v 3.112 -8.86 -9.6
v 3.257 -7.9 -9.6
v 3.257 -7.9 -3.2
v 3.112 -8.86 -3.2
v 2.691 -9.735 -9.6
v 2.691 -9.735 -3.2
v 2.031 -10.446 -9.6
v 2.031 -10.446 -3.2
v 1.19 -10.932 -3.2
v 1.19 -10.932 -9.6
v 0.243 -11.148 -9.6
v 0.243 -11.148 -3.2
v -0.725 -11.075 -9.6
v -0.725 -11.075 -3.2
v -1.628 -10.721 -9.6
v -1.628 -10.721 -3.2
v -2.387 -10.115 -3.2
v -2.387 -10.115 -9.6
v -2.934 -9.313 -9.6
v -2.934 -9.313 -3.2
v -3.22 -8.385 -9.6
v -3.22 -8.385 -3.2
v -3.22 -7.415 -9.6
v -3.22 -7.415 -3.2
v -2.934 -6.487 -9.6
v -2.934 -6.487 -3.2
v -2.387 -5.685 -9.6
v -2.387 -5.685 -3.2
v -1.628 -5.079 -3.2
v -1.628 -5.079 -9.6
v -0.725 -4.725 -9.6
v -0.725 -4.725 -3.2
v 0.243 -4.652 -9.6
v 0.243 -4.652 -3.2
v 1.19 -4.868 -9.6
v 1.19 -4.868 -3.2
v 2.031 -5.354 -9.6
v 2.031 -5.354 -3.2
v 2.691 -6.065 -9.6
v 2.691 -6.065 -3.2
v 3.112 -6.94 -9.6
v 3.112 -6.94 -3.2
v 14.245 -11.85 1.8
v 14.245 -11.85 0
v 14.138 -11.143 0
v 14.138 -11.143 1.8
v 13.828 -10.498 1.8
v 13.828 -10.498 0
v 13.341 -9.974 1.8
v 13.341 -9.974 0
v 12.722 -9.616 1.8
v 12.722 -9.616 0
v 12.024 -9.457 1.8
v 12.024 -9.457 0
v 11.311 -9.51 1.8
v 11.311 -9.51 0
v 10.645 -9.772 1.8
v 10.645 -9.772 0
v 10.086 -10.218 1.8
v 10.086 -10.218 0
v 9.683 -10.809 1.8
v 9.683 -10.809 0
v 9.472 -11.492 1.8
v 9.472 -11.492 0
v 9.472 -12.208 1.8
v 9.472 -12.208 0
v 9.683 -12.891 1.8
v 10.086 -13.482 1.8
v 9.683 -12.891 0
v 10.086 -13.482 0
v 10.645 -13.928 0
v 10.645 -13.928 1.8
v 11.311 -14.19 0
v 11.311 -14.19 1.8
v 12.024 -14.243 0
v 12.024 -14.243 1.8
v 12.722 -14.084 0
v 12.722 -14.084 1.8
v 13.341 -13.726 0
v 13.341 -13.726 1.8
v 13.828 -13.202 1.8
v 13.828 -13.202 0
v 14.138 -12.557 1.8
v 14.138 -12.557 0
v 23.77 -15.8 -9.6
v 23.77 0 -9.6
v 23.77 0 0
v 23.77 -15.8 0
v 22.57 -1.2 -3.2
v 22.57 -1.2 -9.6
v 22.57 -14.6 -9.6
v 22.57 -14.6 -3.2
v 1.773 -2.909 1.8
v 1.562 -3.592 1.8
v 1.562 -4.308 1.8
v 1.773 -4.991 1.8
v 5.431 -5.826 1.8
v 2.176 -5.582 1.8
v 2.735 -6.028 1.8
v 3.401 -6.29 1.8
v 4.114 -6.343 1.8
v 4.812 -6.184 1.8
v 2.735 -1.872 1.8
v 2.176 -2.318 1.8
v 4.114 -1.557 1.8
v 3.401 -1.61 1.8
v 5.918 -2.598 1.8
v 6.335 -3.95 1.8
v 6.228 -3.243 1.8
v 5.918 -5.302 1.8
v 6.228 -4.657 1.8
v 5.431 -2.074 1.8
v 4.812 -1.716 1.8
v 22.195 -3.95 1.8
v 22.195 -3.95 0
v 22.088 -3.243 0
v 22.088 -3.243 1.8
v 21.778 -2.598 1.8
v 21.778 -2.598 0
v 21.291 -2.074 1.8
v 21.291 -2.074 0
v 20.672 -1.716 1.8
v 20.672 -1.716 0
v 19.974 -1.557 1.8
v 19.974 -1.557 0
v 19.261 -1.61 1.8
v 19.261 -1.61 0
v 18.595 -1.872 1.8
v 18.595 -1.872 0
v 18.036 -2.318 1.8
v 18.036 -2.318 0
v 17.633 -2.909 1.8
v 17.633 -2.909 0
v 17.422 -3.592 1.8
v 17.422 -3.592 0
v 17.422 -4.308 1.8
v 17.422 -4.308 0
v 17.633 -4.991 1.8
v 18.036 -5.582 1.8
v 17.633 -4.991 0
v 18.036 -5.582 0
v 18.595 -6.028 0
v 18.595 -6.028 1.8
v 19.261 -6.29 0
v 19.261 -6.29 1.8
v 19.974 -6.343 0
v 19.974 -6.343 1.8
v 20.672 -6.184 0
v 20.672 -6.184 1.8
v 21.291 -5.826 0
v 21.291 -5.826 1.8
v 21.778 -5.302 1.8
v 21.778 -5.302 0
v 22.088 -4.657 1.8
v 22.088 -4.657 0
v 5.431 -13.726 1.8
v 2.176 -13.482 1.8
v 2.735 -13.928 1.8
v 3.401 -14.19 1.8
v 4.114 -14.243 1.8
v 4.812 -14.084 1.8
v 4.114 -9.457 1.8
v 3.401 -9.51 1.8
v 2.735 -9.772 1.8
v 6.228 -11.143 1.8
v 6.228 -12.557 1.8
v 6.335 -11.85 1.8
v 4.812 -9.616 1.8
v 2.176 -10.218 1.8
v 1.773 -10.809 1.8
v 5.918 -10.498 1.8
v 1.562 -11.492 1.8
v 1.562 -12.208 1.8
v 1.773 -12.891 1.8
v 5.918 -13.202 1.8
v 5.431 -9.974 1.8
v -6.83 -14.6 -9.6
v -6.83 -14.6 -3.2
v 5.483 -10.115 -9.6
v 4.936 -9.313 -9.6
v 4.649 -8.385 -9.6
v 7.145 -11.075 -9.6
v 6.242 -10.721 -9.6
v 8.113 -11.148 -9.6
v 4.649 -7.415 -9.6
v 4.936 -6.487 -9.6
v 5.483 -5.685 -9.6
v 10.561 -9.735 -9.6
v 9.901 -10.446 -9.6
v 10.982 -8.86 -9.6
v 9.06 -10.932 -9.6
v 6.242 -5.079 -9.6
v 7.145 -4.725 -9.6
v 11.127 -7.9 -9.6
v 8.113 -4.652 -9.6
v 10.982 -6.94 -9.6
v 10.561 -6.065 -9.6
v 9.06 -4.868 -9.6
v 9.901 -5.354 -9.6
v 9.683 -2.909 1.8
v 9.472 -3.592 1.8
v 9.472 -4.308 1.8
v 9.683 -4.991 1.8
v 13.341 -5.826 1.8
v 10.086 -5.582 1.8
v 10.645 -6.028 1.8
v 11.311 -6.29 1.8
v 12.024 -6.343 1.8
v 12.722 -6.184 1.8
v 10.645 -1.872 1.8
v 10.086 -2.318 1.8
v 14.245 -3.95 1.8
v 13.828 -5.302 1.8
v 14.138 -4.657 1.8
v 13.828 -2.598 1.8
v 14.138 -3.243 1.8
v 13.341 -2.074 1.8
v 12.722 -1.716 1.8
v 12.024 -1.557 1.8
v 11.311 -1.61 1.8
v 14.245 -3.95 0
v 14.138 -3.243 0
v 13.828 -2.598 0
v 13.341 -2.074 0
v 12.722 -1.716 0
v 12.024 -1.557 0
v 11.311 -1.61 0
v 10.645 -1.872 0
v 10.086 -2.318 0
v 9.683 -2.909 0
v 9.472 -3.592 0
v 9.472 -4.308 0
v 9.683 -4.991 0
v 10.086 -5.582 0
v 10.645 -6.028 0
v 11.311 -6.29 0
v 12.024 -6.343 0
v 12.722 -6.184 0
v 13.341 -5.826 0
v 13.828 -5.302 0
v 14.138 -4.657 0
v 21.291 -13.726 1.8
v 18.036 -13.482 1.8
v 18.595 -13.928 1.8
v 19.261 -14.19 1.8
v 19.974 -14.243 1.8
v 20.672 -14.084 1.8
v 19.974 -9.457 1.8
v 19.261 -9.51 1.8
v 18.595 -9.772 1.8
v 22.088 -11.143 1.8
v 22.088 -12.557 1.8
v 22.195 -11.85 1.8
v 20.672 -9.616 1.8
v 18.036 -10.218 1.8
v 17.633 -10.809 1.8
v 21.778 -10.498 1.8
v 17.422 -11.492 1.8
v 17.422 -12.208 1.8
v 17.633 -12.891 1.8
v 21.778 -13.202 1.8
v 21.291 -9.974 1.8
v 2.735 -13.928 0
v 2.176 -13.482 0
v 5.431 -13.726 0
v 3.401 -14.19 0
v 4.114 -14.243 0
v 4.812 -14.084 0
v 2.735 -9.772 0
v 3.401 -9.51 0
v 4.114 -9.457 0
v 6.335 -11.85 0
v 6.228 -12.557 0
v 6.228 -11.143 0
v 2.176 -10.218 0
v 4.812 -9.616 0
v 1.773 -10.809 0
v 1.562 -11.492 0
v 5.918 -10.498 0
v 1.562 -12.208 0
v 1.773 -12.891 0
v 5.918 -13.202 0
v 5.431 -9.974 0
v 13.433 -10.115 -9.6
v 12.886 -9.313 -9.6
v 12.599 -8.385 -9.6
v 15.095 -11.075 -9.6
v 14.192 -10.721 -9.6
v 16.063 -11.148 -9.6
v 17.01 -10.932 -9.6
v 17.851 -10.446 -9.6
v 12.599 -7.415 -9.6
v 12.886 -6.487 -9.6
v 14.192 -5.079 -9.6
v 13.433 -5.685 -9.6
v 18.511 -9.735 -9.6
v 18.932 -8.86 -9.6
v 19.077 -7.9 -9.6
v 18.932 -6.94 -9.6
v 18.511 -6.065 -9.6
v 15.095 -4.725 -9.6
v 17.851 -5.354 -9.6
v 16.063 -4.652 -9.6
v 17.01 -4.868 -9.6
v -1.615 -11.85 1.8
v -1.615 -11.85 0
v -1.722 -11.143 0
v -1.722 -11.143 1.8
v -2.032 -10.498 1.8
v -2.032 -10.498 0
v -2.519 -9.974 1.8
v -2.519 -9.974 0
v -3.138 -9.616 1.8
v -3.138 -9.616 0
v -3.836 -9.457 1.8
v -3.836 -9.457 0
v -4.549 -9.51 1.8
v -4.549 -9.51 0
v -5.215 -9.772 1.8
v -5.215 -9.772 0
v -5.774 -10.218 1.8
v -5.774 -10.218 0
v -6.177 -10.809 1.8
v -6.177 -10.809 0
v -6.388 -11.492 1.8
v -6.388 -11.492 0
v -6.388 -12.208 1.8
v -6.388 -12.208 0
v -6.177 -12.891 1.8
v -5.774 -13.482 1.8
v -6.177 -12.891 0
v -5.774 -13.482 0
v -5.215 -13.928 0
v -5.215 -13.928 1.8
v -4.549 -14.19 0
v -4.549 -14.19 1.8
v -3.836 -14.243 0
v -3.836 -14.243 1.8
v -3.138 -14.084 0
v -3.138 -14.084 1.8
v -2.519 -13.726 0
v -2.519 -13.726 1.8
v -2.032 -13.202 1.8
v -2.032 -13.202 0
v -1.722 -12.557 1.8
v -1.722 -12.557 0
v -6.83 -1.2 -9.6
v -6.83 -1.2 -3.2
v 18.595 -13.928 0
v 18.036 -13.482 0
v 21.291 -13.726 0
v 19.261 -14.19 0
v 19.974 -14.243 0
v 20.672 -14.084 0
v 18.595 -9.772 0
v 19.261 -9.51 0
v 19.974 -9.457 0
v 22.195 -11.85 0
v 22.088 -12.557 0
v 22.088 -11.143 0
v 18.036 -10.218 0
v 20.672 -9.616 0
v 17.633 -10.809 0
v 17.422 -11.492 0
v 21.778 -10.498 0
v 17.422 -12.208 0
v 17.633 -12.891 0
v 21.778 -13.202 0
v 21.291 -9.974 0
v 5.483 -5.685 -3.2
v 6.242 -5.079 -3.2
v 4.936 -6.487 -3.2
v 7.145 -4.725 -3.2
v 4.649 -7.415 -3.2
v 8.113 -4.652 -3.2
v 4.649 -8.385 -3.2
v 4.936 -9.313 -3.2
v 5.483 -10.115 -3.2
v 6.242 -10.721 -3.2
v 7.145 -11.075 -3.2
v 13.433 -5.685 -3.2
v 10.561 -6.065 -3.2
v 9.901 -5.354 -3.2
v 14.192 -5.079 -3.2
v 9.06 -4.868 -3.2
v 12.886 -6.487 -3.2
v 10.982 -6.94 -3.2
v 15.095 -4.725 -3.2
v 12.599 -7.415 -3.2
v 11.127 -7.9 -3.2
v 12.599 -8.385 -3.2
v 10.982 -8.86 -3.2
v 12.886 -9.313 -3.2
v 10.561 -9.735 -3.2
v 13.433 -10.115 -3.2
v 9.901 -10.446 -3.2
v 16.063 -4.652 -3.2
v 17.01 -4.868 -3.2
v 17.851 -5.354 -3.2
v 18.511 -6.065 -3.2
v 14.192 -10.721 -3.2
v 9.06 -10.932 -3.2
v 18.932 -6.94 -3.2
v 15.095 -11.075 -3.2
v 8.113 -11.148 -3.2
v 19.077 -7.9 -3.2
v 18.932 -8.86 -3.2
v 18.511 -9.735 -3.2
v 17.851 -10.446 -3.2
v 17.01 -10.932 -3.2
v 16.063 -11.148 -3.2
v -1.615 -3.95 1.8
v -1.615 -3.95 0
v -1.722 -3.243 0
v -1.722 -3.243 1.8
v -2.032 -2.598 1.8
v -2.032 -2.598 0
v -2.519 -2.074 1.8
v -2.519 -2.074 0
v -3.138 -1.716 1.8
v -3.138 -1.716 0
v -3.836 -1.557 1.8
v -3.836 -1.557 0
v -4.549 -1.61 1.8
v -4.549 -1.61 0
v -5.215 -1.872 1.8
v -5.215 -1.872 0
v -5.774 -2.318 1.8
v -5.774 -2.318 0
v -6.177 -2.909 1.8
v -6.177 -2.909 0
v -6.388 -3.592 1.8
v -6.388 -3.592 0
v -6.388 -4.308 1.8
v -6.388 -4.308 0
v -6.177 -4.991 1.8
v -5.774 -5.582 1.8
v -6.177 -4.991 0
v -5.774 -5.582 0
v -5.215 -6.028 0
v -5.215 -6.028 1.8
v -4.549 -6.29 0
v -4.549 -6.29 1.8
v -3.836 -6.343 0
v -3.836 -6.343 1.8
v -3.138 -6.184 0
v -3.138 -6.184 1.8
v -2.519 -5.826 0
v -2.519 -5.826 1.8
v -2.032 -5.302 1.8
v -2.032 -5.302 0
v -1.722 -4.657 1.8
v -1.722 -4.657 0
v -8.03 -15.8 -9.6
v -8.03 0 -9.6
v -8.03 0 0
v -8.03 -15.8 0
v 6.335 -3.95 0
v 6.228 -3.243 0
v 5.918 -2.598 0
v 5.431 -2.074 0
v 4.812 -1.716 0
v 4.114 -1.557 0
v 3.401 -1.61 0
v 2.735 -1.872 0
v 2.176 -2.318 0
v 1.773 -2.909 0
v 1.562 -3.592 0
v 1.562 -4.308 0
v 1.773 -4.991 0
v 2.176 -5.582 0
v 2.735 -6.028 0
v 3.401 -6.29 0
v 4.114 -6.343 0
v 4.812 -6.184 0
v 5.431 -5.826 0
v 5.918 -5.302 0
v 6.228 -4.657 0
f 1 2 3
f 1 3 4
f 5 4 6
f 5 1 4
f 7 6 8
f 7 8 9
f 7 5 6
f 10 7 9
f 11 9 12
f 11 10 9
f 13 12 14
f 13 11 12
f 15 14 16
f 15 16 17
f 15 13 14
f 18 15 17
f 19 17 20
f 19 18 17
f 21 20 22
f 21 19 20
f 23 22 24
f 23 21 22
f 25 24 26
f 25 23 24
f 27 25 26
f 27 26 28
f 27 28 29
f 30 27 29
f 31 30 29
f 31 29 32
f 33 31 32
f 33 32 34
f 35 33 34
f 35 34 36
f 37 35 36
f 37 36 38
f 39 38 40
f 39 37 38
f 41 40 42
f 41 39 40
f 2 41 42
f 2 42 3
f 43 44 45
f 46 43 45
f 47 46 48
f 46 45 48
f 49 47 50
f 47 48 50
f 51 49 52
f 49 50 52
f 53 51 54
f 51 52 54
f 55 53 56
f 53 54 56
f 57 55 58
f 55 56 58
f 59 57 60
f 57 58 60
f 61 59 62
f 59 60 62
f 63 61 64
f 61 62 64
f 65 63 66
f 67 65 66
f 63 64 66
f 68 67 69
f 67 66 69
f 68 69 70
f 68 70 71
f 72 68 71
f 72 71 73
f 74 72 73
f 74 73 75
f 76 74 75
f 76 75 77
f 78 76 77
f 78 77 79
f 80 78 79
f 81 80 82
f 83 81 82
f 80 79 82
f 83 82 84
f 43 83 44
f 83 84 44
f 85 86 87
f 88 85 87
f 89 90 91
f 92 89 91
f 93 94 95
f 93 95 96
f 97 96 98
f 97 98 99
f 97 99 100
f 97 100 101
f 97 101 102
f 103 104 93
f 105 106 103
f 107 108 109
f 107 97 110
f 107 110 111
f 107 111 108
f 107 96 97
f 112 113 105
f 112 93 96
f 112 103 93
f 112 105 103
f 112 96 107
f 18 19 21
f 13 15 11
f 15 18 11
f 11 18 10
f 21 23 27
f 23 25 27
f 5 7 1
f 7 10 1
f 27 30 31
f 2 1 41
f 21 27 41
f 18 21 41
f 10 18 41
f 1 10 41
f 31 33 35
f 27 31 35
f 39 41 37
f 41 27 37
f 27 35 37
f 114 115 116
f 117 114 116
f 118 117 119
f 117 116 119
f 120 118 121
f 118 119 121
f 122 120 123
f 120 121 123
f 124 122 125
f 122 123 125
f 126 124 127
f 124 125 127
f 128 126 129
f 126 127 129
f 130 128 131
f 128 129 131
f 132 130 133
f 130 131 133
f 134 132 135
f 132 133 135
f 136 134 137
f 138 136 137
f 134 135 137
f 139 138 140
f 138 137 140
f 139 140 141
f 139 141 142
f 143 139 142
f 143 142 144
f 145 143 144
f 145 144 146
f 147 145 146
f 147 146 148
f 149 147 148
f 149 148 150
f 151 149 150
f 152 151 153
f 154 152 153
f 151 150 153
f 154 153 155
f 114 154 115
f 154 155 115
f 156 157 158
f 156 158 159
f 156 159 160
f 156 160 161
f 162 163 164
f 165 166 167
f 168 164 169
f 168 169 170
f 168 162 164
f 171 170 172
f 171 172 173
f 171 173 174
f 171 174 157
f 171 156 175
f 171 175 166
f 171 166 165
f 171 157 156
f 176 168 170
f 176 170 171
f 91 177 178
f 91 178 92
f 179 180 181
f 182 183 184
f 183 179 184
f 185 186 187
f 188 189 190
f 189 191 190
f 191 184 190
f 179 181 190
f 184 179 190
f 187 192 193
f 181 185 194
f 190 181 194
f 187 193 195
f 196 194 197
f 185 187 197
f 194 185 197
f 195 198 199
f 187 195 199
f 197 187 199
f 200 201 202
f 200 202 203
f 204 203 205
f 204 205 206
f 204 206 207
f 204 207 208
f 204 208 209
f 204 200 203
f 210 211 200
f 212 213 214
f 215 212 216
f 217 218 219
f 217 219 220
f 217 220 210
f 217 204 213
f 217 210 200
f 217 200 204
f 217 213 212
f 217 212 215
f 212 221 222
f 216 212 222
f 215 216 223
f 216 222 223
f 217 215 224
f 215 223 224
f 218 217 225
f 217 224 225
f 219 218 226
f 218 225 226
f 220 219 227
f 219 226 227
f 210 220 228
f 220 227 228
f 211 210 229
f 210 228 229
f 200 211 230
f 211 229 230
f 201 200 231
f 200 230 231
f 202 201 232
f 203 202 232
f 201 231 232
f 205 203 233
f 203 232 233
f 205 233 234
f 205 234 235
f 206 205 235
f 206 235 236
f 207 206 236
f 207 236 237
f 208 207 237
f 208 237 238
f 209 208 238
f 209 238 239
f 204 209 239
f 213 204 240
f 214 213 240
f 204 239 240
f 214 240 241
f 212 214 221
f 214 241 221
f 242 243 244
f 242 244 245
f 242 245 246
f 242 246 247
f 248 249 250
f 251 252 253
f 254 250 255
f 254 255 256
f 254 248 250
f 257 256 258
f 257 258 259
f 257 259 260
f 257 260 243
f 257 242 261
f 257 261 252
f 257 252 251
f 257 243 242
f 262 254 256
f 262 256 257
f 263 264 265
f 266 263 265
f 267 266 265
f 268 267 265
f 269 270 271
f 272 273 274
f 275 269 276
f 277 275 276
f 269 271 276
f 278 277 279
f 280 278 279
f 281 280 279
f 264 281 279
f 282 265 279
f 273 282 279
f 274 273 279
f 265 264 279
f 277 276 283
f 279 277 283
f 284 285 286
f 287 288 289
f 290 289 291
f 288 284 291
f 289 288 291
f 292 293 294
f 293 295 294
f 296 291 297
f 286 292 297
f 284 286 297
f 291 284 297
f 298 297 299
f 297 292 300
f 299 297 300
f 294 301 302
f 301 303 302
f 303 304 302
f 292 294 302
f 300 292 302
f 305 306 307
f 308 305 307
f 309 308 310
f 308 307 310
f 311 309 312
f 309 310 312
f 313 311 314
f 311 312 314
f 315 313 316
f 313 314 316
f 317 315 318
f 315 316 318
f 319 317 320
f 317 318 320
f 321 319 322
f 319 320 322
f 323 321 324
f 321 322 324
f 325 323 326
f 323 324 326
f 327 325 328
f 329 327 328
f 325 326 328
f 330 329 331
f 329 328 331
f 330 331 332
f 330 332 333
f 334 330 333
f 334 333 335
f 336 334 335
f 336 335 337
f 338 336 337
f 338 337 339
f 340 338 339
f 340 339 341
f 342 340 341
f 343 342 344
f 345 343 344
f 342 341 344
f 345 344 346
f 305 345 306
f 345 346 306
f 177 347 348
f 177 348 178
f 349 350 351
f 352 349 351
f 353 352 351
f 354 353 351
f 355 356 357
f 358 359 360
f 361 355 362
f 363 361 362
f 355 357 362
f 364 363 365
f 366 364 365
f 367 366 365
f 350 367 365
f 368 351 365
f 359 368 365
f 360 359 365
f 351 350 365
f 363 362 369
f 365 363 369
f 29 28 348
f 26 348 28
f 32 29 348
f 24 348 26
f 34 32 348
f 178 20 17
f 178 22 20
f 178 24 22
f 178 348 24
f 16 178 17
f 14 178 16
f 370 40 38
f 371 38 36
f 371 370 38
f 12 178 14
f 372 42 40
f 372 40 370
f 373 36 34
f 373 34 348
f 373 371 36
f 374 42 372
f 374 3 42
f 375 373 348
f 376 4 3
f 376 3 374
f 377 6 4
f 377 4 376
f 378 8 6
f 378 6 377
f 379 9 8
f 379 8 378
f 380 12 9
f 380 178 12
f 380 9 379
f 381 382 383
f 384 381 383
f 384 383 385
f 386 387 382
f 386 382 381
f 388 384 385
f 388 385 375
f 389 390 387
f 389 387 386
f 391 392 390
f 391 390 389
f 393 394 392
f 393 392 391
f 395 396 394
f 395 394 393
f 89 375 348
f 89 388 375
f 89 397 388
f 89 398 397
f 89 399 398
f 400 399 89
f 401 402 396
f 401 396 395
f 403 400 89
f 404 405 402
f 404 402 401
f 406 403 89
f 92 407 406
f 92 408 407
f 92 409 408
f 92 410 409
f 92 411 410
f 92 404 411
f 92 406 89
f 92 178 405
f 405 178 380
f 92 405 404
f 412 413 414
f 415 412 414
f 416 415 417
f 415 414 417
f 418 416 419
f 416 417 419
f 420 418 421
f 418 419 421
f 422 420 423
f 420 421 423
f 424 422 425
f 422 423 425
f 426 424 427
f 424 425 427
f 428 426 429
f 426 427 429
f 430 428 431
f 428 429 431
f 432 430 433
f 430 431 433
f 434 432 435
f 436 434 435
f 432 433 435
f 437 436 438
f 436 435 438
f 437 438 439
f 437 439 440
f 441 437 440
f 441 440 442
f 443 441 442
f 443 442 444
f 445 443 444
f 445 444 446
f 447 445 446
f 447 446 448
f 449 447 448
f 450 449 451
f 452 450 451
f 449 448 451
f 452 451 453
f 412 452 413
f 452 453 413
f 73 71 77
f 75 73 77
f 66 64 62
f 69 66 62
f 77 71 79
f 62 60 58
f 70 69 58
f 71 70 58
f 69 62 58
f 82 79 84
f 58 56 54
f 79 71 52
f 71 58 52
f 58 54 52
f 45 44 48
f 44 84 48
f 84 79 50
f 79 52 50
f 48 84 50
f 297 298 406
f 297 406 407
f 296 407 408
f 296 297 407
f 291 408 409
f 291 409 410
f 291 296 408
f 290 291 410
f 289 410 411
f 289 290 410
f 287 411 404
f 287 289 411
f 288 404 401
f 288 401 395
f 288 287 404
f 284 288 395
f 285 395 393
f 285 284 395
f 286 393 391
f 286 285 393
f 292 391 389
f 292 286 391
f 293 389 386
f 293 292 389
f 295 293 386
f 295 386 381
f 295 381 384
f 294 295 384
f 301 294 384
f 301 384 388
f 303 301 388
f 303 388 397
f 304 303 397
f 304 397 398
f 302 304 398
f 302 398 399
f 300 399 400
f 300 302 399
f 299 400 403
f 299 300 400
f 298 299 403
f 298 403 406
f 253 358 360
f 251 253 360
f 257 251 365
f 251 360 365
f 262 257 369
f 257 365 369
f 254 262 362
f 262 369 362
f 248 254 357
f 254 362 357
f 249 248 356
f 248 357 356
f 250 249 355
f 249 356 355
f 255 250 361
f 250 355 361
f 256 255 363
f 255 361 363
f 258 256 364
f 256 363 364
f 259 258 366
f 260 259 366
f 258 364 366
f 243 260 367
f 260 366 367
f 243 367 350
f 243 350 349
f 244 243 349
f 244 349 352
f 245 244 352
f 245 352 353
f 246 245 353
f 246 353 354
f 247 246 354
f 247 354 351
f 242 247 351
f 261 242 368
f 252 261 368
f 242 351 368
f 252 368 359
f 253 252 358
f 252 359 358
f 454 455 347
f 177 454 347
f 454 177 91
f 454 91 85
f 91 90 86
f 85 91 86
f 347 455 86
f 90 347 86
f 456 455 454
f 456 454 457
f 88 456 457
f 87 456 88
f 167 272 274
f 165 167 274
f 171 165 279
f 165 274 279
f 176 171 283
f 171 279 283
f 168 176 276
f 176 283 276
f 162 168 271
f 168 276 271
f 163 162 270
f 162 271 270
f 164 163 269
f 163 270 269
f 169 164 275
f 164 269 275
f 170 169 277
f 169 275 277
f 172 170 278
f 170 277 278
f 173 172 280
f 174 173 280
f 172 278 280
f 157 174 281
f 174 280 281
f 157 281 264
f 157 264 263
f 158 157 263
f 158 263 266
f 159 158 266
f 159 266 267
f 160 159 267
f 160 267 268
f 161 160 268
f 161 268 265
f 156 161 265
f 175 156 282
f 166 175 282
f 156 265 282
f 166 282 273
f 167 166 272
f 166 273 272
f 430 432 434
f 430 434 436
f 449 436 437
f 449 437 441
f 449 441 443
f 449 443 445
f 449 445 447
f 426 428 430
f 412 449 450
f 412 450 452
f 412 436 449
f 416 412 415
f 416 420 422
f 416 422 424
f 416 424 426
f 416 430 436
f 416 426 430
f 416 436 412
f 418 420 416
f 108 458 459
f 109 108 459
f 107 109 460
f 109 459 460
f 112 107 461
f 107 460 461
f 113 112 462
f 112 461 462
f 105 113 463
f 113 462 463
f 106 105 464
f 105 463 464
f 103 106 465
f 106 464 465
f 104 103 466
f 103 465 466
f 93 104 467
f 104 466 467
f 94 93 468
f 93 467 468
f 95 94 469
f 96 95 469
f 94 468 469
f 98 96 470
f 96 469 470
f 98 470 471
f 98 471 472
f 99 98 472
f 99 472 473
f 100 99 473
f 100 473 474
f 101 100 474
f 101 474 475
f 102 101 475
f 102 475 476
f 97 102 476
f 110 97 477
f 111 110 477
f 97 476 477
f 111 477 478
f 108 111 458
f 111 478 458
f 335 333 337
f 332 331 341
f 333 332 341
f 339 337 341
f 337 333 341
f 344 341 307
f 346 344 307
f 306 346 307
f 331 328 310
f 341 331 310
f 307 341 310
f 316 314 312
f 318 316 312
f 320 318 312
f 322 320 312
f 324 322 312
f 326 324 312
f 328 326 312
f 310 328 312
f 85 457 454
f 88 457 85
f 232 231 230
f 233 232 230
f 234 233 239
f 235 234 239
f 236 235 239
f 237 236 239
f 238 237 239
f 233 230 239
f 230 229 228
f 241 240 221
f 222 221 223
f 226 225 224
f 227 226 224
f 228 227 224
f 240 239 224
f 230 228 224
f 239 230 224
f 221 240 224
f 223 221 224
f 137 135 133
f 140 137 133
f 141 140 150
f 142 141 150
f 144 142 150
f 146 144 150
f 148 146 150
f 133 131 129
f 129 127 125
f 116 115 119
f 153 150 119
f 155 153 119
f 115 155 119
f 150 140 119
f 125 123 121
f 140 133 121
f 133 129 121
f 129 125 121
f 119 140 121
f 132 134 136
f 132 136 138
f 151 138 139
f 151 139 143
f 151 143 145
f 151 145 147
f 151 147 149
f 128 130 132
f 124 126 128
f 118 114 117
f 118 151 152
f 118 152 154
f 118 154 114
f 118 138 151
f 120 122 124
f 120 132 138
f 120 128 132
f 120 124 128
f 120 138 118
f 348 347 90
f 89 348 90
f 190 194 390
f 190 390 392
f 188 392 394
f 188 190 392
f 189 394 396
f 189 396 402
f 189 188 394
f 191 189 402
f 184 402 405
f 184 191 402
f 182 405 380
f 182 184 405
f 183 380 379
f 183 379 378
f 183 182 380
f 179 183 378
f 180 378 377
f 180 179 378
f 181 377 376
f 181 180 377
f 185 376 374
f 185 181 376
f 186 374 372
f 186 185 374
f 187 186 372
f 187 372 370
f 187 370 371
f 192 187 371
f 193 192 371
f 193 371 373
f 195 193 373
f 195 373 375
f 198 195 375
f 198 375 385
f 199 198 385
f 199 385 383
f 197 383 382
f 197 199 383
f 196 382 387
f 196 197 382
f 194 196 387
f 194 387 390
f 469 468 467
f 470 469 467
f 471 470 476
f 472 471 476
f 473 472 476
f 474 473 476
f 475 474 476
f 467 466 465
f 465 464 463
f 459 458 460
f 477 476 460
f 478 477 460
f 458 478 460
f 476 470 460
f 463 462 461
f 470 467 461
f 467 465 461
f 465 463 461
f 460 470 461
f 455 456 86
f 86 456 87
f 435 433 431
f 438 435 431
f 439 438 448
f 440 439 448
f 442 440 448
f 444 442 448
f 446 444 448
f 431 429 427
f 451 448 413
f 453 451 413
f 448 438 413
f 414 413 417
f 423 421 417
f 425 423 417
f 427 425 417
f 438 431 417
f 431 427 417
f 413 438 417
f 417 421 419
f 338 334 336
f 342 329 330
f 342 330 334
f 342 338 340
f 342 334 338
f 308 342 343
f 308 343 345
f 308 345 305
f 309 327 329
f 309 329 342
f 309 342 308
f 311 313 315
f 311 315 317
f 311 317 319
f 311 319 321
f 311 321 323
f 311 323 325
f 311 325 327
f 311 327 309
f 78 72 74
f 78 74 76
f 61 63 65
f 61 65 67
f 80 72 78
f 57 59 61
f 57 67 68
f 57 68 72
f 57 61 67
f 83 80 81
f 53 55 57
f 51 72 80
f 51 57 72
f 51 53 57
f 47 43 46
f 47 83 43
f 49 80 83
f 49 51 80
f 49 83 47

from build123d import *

# Parameters (mm, degrees)
F0_W     = 31.8
F0_H     = 9.6
F1_DEPTH = 15.8
F2_R     = 2.4
F3_DEPTH = 1.8
F4_W     = 29.4
F4_H     = 13.4
F4_R     = 3.25685
F5_DEPTH = 6.4


# Not quite as in the source:
# - the program builds the solid bodies; features that only make, move or delete a surface that nothing else refers to are left out


with BuildPart() as f1:
    # F0 (on Front) → F1 (new body)
    with BuildSketch(Plane.XZ):
        with Locations((7.8699710073, -4.8)):
            Rectangle(F0_W, F0_H)
    extrude(amount=F1_DEPTH)

    # F4 (on face) → F5 (cut)
    with BuildSketch(Plane(origin=(0, 0, -9.6), x_dir=(1, 0, 0), z_dir=(0, 0, -1))):
        with Locations((7.8699710073, 7.9)):
            Rectangle(F4_W, F4_H)
        with Locations((0, 7.9)):
            Circle(F4_R, mode=Mode.SUBTRACT)
        with Locations((7.8699710073, 7.9)):
            Circle(F4_R, mode=Mode.SUBTRACT)
        with Locations((15.8199710073, 7.9)):
            Circle(F4_R, mode=Mode.SUBTRACT)
    extrude(amount=-F5_DEPTH, mode=Mode.SUBTRACT)


with BuildPart() as f3:
    # F2 (on face) → F3 (new body)
    with BuildSketch(Plane.XY):
        with Locations((19.7949710073, -3.95)):
            Circle(F2_R)
    extrude(amount=F3_DEPTH)


with BuildPart() as f3b:
    # F2 (on face) → F3, piece 2 (new body)
    with BuildSketch(Plane.XY):
        with Locations((19.7949710073, -11.85)):
            Circle(F2_R)
    extrude(amount=F3_DEPTH)


with BuildPart() as f3c:
    # F2 (on face) → F3, piece 3 (new body)
    with BuildSketch(Plane.XY):
        with Locations((11.8449710073, -11.85)):
            Circle(F2_R)
    extrude(amount=F3_DEPTH)


with BuildPart() as f3d:
    # F2 (on face) → F3, piece 4 (new body)
    with BuildSketch(Plane.XY):
        with Locations((3.9349855036, -3.95)):
            Circle(F2_R)
    extrude(amount=F3_DEPTH)


with BuildPart() as f3e:
    # F2 (on face) → F3, piece 5 (new body)
    with BuildSketch(Plane.XY):
        with Locations((11.8449710073, -3.95)):
            Circle(F2_R)
    extrude(amount=F3_DEPTH)


with BuildPart() as f3f:
    # F2 (on face) → F3, piece 6 (new body)
    with BuildSketch(Plane.XY):
        with Locations((3.9349855036, -11.85)):
            Circle(F2_R)
    extrude(amount=F3_DEPTH)


with BuildPart() as f3g:
    # F2 (on face) → F3, piece 7 (new body)
    with BuildSketch(Plane.XY):
        with Locations((-4.0150144964, -11.85)):
            Circle(F2_R)
    extrude(amount=F3_DEPTH)


with BuildPart() as f3h:
    # F2 (on face) → F3, piece 8 (new body)
    with BuildSketch(Plane.XY):
        with Locations((-4.0150144964, -3.95)):
            Circle(F2_R)
    extrude(amount=F3_DEPTH)


solid = Compound([f1.part, f3.part, f3b.part, f3c.part, f3d.part, f3e.part, f3f.part, f3g.part, f3h.part])
